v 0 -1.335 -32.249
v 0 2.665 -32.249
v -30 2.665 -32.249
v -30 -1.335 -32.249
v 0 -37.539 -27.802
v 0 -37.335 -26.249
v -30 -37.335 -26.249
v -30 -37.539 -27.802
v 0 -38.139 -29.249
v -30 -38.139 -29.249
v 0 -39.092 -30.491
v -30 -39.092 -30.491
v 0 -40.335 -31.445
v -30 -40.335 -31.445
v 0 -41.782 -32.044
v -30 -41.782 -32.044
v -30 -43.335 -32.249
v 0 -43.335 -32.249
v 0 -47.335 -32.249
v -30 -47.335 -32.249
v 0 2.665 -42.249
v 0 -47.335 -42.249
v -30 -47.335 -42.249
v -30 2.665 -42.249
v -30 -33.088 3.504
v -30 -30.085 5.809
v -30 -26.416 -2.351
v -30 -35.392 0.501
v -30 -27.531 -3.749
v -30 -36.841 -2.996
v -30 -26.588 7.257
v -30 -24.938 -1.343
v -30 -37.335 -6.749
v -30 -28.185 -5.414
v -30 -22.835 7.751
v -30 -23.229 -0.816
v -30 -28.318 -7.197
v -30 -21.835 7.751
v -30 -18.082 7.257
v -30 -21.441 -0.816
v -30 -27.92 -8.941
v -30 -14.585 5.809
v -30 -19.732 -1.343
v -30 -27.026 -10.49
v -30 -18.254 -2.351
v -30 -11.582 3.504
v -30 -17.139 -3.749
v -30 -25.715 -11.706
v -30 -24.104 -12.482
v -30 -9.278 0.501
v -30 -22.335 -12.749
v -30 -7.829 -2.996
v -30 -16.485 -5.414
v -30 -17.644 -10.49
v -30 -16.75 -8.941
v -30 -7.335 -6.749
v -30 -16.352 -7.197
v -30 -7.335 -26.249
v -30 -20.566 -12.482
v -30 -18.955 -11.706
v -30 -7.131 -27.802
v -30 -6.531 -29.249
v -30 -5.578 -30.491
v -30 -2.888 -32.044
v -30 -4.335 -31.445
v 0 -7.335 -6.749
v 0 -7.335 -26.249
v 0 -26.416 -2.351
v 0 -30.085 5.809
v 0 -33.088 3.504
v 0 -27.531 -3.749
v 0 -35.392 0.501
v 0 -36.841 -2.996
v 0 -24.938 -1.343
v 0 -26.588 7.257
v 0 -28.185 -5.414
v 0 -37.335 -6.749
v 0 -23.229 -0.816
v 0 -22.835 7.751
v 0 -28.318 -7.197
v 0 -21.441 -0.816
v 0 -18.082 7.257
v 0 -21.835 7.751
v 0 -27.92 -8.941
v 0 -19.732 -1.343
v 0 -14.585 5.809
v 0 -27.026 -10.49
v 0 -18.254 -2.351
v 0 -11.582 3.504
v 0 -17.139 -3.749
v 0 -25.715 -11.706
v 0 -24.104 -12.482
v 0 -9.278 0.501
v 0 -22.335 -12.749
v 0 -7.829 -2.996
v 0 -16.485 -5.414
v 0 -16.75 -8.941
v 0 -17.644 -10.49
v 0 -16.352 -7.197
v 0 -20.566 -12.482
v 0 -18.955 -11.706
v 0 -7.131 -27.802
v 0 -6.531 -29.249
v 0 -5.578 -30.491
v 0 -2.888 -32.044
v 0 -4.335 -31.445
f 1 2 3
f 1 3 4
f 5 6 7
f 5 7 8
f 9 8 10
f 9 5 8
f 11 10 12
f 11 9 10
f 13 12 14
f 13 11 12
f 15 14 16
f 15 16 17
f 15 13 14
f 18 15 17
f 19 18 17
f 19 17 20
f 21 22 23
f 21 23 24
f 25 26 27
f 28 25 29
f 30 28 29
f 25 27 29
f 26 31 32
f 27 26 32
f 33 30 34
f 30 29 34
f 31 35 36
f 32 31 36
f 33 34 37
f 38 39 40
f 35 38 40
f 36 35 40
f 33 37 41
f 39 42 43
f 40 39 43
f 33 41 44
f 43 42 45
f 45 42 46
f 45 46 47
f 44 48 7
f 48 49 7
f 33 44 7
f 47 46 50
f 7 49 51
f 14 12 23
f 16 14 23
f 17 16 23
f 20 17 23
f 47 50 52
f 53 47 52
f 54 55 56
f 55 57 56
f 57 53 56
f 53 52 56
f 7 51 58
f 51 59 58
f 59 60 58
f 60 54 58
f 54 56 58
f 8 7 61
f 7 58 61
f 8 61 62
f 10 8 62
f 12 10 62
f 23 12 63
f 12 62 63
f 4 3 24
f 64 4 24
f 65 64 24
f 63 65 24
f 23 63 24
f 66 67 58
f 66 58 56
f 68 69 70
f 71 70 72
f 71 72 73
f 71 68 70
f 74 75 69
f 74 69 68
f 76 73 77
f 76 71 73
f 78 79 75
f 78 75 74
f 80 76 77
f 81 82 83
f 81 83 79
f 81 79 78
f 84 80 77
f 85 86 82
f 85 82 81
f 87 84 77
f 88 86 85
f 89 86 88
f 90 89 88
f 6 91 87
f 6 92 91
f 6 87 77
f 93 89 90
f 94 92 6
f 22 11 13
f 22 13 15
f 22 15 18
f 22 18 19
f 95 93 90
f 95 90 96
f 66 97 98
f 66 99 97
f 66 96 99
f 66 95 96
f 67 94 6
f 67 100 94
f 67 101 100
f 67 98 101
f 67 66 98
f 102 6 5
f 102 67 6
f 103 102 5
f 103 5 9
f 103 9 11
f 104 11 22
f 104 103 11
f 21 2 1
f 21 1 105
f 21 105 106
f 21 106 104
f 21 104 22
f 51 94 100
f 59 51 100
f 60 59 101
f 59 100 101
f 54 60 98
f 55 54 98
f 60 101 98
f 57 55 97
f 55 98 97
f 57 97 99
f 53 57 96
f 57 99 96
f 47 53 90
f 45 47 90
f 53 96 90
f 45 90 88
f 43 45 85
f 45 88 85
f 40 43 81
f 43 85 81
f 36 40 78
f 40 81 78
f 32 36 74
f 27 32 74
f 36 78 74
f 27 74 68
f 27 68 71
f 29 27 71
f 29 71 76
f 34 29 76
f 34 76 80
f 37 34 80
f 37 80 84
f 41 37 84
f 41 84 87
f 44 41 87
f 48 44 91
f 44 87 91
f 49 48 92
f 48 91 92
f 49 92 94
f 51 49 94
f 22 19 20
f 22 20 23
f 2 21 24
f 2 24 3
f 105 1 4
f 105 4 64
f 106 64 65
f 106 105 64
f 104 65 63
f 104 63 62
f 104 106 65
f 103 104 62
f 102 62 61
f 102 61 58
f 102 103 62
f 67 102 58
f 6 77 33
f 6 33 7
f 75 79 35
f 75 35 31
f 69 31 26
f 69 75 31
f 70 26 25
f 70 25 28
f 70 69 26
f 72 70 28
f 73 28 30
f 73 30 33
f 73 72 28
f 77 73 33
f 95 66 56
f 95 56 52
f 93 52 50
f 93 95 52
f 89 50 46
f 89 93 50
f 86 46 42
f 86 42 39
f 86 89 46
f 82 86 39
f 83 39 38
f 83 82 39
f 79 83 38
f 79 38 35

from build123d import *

# Parameters (mm, degrees)
RESSALTO_EXTRUS_O2_DEPTH = 30
ESBO_O5_R                = 6
CORTE_EXTRUS_O1_DEPTH    = 30


with BuildPart() as part:
    # Esboço3 → Ressalto-extrusão2 (new body)
    with BuildSketch(Plane(origin=(0, 0, 0), x_dir=(0, 0, -1), z_dir=(1, 0, 0))):
        with BuildLine():
            Line((42.248831229, -47.335013165), (42.248831229, 2.664986835))
            Line((42.248831229, 2.664986835), (32.248831229, 2.664986835))
            Line((32.248831229, 2.664986835), (32.248831229, -1.335013165))
            ThreePointArc((32.248831229, -1.335013165), (30.491471916, -5.577653852), (26.248831229, -7.335013165))
            Line((26.248831229, -7.335013165), (6.748831229, -7.335013165))
            ThreePointArc((6.748831229, -7.335013165), (-3.504217098, -11.581964838), (-7.751168771, -21.835013165))
            Line((-7.751168771, -21.835013165), (-7.751168771, -22.835013165))
            ThreePointArc((-7.751168771, -22.835013165), (-3.504217098, -33.088061493), (6.748831229, -37.335013165))
            Line((6.748831229, -37.335013165), (26.248831229, -37.335013165))
            ThreePointArc((26.248831229, -37.335013165), (30.491471916, -39.092372478), (32.248831229, -43.335013165))
            Line((32.248831229, -43.335013165), (32.248831229, -47.335013165))
            Line((32.248831229, -47.335013165), (42.248831229, -47.335013165))
        make_face()
    extrude(amount=-RESSALTO_EXTRUS_O2_DEPTH)

    # Esboço5 → Corte-extrusão1 (cut)
    with BuildSketch(Plane(origin=(0, 0, 0), x_dir=(0, 0, -1), z_dir=(1, 0, 0))):
        with Locations((6.748831229, -22.335013165)):
            Circle(ESBO_O5_R)
    extrude(amount=-CORTE_EXTRUS_O1_DEPTH, mode=Mode.SUBTRACT)


solid = part.part
